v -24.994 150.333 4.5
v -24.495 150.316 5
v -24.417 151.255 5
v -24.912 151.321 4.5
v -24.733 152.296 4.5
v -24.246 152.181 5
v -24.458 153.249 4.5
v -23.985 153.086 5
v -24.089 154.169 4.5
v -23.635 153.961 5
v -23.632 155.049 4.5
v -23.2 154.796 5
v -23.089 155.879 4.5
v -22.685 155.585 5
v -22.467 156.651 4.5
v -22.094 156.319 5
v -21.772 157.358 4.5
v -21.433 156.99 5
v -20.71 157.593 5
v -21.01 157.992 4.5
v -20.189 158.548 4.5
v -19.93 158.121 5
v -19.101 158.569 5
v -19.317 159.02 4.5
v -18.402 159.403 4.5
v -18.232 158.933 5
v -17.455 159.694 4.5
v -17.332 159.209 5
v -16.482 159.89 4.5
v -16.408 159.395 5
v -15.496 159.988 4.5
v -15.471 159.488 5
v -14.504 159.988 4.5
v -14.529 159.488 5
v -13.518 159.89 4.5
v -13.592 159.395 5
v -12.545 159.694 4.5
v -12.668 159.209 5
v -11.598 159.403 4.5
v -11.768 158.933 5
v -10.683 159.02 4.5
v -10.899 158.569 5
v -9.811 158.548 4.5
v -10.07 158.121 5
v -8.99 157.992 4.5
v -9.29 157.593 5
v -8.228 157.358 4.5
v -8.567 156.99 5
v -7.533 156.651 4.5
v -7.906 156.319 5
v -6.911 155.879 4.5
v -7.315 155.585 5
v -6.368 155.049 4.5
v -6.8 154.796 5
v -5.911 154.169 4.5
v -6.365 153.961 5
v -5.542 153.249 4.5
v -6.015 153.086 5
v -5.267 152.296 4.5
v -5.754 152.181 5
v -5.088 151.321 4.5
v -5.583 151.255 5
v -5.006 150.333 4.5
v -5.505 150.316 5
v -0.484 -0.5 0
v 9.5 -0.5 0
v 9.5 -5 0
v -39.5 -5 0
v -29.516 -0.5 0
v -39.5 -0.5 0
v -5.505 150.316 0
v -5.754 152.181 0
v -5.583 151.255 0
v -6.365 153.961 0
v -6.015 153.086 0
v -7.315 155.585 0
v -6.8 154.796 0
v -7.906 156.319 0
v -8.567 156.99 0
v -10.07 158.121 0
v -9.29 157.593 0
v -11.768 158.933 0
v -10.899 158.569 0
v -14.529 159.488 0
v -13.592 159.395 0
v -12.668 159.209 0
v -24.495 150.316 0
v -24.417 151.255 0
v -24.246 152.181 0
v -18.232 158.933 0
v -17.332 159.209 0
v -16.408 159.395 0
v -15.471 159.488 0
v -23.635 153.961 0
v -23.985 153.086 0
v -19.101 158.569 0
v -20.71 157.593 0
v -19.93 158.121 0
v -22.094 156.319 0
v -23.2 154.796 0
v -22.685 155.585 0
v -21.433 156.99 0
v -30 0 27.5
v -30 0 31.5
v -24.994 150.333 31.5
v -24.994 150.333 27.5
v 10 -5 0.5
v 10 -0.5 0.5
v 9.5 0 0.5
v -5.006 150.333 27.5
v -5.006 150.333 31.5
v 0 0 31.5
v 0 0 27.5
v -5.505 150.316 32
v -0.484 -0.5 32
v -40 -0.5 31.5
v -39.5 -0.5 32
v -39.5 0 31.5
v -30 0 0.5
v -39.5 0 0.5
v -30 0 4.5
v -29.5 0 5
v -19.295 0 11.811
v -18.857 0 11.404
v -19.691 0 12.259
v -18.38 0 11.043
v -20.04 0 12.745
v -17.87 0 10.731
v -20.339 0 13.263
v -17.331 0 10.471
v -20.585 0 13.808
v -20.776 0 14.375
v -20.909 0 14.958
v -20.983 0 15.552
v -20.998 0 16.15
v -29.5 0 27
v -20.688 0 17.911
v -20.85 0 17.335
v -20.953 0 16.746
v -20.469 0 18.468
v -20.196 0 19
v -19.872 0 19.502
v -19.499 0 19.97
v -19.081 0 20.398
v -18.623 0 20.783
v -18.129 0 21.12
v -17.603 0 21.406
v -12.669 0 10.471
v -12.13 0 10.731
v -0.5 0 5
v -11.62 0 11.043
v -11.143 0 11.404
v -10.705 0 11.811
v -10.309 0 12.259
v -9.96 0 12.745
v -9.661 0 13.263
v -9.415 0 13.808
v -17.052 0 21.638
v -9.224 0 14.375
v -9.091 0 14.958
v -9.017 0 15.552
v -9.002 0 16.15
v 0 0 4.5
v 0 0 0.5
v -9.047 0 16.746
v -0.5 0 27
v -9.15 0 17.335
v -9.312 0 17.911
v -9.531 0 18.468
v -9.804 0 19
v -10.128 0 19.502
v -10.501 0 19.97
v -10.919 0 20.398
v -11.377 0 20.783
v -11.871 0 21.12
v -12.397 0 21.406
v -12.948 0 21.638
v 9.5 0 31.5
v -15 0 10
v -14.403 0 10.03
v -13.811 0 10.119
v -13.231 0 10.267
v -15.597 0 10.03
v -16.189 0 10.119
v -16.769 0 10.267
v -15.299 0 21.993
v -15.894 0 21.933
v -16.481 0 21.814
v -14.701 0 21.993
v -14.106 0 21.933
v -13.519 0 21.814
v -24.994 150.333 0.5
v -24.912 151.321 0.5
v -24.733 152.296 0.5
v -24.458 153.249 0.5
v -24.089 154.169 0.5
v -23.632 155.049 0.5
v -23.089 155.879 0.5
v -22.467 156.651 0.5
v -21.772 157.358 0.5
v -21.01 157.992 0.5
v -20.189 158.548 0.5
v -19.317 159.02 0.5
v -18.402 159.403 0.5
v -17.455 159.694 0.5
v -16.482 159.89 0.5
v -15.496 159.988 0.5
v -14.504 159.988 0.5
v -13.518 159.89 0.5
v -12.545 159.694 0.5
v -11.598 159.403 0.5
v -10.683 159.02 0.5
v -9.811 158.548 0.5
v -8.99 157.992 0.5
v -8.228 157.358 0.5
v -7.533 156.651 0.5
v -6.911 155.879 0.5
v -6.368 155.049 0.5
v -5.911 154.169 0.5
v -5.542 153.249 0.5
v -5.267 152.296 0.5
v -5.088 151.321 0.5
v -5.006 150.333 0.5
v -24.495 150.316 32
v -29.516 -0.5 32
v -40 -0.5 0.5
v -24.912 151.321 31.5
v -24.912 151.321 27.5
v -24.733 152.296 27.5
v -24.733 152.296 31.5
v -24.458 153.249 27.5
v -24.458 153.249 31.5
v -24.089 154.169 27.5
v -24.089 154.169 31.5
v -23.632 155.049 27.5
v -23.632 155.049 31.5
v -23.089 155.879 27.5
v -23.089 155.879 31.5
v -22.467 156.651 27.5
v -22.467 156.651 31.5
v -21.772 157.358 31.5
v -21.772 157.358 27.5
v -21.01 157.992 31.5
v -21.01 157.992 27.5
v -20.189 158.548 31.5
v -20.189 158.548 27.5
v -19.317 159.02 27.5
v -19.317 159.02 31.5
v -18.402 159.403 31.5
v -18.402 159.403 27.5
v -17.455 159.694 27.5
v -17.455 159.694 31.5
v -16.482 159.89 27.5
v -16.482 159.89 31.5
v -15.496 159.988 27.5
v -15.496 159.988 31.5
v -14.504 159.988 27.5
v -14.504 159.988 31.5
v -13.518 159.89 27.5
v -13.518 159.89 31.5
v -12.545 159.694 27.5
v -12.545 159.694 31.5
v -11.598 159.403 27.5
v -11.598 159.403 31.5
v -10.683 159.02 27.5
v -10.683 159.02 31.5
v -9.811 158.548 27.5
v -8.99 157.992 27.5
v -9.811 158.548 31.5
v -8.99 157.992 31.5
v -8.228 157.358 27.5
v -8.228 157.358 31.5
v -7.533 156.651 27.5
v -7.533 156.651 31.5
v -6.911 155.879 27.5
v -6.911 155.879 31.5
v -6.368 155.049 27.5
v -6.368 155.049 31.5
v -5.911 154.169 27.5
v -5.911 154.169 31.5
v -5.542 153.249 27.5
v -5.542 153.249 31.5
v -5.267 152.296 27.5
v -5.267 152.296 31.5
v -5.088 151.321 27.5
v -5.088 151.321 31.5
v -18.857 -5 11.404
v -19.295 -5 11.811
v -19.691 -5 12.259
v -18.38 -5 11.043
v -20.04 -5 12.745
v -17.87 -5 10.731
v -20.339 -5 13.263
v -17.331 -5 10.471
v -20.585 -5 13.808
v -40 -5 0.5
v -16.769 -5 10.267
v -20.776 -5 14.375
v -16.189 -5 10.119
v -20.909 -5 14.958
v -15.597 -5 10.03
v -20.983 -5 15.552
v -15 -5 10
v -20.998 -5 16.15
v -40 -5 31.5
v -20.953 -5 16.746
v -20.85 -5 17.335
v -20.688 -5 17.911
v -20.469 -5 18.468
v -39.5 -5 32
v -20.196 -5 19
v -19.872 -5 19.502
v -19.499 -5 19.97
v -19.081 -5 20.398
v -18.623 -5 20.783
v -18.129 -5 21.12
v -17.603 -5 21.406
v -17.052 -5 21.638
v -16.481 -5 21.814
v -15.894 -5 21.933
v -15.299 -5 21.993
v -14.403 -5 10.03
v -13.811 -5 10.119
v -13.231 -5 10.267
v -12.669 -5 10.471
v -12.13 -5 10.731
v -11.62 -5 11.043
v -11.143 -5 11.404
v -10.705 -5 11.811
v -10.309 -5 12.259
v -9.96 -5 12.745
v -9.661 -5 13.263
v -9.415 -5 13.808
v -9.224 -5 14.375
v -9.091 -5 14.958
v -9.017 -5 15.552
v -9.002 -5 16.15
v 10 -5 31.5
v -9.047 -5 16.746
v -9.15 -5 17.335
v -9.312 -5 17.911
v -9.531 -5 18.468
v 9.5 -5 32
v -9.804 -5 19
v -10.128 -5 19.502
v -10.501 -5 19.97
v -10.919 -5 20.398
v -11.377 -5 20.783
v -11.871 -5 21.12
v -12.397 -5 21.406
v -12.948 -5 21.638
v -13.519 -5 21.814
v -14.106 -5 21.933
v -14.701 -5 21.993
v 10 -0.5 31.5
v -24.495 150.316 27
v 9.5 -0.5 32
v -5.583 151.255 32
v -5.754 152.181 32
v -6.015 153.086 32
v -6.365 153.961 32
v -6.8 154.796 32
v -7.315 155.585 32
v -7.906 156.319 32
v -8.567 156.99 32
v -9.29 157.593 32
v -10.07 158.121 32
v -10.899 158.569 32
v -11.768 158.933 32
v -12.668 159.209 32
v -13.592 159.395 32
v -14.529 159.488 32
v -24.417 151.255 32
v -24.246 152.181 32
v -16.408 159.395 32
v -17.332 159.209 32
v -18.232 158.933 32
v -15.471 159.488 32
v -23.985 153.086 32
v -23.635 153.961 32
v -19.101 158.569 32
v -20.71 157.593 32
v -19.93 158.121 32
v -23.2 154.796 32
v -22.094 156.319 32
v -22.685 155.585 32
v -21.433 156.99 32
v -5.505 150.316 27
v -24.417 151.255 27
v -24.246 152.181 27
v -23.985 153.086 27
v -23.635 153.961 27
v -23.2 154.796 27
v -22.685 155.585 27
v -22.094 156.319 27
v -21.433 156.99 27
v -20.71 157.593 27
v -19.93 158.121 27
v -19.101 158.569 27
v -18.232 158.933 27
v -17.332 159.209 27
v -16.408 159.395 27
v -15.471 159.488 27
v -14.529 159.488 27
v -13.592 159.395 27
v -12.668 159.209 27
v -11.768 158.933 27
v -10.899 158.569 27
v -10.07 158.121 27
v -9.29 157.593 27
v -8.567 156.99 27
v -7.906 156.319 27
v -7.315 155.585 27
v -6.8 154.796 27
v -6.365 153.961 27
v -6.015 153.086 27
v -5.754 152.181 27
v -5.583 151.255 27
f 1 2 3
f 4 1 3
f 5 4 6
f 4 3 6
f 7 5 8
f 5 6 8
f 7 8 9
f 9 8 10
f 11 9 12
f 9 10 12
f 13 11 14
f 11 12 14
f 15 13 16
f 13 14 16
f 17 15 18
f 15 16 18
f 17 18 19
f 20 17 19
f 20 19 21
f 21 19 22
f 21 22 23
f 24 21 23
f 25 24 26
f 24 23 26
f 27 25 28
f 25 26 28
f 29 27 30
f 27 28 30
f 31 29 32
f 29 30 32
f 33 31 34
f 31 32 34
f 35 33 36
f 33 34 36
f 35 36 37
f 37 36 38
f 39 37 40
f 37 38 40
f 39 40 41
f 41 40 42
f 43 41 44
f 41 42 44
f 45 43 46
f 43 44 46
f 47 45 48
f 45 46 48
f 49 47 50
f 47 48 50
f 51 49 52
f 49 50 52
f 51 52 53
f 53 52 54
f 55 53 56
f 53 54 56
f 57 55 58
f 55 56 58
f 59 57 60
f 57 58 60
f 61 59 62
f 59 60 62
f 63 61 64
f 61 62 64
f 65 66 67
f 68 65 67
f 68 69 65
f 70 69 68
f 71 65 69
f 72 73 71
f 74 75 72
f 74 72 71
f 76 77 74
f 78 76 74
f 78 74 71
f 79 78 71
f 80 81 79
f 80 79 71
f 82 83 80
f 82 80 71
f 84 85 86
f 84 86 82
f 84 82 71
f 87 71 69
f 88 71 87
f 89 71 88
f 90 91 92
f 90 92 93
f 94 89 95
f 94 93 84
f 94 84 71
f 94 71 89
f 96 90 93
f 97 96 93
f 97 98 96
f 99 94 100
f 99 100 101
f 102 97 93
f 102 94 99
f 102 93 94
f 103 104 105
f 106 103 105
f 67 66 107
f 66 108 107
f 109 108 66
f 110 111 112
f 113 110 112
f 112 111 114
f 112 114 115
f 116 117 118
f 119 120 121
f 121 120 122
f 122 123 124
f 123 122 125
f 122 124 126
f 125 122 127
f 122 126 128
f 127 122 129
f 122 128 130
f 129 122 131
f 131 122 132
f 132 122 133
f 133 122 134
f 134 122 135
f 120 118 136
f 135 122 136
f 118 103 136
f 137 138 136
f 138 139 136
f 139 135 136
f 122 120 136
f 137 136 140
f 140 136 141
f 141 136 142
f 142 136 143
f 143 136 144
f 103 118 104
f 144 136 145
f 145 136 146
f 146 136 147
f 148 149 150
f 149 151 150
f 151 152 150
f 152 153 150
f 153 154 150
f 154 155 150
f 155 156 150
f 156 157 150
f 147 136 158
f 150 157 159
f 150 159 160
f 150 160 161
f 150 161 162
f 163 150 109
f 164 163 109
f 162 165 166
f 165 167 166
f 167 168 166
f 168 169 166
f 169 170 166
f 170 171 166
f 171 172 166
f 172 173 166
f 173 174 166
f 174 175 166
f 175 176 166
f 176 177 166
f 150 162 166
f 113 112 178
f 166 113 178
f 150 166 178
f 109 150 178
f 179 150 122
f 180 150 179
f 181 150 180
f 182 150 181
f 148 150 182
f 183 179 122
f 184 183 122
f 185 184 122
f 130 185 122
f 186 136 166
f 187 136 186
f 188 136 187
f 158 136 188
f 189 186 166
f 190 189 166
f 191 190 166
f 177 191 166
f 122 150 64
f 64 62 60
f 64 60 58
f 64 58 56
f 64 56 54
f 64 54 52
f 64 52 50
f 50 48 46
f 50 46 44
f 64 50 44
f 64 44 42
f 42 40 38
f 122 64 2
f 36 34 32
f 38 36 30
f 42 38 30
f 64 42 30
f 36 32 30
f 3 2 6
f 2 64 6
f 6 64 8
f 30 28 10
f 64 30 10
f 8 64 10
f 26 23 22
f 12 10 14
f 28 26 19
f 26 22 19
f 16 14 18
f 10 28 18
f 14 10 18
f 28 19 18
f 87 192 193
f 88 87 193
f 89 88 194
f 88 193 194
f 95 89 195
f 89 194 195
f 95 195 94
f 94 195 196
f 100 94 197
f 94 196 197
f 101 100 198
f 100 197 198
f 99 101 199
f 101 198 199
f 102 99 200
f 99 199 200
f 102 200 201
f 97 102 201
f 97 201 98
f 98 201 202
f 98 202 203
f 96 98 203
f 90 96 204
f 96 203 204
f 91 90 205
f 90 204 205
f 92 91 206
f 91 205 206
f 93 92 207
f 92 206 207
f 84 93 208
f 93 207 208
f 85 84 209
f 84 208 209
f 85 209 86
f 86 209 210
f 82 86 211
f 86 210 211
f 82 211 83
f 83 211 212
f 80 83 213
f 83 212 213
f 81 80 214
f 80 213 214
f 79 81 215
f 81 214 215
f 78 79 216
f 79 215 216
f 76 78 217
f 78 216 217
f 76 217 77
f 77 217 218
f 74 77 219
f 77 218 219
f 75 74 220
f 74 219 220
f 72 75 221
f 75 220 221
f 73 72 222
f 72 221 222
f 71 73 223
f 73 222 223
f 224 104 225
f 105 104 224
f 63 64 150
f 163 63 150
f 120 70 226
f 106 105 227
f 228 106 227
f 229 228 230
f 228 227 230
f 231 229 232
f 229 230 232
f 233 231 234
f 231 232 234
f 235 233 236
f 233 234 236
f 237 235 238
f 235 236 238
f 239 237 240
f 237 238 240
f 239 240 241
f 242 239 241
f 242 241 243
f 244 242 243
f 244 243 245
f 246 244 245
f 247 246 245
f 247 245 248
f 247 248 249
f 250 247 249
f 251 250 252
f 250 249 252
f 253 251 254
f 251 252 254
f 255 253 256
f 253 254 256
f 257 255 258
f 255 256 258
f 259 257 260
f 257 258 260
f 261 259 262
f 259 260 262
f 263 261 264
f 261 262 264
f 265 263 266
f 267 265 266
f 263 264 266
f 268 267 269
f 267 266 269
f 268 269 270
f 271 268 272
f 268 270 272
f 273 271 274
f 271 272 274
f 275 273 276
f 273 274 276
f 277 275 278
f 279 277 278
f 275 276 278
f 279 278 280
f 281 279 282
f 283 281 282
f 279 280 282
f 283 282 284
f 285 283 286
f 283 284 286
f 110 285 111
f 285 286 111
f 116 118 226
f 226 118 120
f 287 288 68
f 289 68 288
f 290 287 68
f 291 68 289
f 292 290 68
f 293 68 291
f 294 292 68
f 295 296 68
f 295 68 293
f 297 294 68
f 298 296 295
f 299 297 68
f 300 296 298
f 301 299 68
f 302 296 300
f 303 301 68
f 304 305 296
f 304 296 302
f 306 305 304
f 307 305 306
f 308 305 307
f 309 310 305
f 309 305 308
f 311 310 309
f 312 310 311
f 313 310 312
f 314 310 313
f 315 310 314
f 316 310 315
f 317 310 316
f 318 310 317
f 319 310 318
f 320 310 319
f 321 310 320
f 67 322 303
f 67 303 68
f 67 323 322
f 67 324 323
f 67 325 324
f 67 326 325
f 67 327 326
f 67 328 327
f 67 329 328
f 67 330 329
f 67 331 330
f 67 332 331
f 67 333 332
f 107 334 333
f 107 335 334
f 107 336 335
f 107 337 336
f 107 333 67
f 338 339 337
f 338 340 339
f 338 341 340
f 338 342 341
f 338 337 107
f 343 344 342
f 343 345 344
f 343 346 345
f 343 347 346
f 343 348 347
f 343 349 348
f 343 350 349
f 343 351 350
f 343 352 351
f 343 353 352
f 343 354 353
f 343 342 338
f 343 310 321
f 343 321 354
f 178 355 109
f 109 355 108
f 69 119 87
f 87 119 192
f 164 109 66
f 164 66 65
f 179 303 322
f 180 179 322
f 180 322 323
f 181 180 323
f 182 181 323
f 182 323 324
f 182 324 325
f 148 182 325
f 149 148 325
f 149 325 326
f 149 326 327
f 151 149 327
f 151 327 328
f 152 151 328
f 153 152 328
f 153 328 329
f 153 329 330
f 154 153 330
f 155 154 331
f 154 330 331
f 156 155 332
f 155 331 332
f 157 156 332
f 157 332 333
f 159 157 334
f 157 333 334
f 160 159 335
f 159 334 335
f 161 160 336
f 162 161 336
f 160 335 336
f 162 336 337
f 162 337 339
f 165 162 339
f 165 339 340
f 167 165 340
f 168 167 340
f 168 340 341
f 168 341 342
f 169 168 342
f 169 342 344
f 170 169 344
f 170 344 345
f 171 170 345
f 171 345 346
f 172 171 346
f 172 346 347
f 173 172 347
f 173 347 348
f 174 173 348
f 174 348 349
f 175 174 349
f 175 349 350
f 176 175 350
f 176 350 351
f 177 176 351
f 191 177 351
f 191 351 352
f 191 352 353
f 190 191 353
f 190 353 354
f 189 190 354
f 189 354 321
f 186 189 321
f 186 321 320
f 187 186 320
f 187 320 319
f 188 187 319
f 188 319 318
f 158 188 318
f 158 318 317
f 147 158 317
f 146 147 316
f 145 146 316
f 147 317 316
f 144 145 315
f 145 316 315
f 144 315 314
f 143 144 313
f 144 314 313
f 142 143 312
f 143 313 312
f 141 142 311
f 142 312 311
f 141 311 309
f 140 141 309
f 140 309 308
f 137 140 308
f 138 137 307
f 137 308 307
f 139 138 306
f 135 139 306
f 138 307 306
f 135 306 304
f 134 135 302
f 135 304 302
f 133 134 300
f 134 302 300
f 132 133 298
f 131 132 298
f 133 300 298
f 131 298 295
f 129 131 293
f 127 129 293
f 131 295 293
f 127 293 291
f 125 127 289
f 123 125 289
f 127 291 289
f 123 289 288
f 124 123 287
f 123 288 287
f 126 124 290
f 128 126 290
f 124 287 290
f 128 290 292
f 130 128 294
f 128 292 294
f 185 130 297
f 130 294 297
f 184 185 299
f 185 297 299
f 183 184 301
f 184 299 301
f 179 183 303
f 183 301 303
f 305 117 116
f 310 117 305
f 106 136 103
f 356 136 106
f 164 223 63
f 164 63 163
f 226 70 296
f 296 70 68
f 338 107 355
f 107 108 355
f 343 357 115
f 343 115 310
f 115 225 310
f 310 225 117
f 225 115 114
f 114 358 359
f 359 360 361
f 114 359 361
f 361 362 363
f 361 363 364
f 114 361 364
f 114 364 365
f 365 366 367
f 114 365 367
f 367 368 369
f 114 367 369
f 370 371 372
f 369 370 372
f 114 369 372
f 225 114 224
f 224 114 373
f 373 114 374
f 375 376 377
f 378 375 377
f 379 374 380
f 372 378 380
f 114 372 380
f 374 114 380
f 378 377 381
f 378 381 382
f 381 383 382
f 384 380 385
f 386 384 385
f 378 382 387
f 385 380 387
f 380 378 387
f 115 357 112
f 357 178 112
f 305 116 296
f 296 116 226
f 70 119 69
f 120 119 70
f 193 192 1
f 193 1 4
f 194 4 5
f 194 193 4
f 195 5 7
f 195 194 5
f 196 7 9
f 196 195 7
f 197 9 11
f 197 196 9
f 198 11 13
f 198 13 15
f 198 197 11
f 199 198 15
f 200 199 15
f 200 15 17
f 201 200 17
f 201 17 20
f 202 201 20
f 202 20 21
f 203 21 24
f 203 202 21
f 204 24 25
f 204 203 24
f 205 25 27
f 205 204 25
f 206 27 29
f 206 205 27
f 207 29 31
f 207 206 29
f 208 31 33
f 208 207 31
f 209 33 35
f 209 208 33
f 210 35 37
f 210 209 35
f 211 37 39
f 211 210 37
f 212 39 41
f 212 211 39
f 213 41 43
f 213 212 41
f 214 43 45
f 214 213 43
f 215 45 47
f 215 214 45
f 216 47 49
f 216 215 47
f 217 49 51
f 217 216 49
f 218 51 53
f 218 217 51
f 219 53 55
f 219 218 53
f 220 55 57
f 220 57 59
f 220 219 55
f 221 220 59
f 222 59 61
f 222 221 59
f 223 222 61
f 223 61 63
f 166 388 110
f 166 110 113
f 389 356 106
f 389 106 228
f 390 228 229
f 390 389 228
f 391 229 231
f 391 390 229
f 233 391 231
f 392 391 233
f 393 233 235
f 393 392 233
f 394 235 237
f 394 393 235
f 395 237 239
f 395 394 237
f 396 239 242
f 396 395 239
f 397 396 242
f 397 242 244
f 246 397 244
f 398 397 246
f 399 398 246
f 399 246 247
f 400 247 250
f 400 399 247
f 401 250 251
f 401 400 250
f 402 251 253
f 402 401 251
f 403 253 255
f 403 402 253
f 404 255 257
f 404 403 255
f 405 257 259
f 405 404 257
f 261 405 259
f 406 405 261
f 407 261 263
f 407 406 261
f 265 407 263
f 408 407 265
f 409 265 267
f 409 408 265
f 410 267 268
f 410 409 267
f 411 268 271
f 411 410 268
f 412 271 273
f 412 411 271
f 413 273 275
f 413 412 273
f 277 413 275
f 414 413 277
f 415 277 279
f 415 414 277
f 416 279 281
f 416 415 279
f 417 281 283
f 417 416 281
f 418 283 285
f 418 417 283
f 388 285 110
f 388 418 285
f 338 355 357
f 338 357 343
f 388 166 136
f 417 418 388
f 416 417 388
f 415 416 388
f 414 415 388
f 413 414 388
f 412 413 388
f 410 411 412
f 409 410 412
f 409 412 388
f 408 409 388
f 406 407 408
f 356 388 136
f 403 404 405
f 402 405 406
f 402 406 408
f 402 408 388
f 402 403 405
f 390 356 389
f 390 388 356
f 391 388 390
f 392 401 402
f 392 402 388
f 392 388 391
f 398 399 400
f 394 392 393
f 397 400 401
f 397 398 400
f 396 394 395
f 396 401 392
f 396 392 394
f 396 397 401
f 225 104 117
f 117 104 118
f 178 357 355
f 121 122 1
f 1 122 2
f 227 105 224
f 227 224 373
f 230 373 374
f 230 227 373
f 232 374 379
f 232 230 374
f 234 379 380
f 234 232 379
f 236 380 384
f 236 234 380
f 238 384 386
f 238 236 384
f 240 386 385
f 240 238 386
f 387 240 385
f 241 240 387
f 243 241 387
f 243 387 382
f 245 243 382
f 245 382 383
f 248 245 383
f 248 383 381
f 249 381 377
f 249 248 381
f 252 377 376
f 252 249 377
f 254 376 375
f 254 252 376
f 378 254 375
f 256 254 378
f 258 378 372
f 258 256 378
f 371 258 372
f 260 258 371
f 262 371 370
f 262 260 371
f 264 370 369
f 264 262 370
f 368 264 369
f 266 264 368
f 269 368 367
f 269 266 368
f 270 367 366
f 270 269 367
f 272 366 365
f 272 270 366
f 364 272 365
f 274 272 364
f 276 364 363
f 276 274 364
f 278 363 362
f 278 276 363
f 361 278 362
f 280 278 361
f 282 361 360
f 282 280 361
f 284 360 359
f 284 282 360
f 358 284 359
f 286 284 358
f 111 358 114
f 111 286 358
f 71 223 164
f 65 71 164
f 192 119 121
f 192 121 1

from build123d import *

# Parameters (mm, degrees)
BOSS_EXTRUDE2_DEPTH = 5
BOSS_EXTRUDE3_DEPTH = 5
SKETCH3_R           = 6
CUT_EXTRUDE1_DEPTH  = 173.768631412
CHAMFER1_SIZE       = 0.5


with BuildPart() as part:
    # Sketch2 → Boss-Extrude2 (new body)
    with BuildSketch(Plane(origin=(0, 0, 0), x_dir=(1, 0, 0), z_dir=(0, 1, 0))):
        Polygon((0, 0), (-40, 0), (-40, -16), (0, -16), (10, -16), (10, 0), align=None)
    extrude(amount=-BOSS_EXTRUDE2_DEPTH)

    # Sketch1 → Boss-Extrude3 (add)
    with BuildSketch(Plane.XY):
        with BuildLine():
            Line((0, 0), (-30, 0))
            Line((-30, 0), (-24.994461357, 150.332779469))
            ThreePointArc((-24.994461357, 150.332779469), (-15, 160), (-5.005538643, 150.332779469))
            Line((-5.005538643, 150.332779469), (0, 0))
        make_face()
    extrude(amount=BOSS_EXTRUDE3_DEPTH)

    # Mirror1: part across plane


with BuildPart() as part_1:
    add(part.part)
    add(part.part.mirror(Plane(origin=(10, -5, 16), x_dir=(1, 0, 0), z_dir=(0, 0, 1))))

    # Sketch3 → Cut-Extrude1 (cut, through all)
    with BuildSketch(Plane.XZ.offset(5)):
        with Locations(Location((-15, 16, 0), (0, 0, 270))):
            Circle(SKETCH3_R)
    extrude(amount=-CUT_EXTRUDE1_DEPTH, mode=Mode.SUBTRACT)

    # Chamfer1
    chamfer1_edges = [part_1.edges().sort_by_distance(p)[0] for p in [
        (10, -2.5, 0),
        (-40, -2.5, 0),
        (-35, 0, 0),
        (-2.502769321, 75.166389735, 0),
        (-15, 160, 0),
        (-27.497230679, 75.166389735, 0),
        (-2.502769321, 75.166389735, 5),
        (-15, 160, 5),
        (-27.497230679, 75.166389735, 5),
        (-40, -2.5, 32),
        (5, 0, 32),
        (-2.502769321, 75.166389735, 32),
        (-15, 160, 32),
        (-27.497230679, 75.166389735, 32),
        (-35, 0, 32),
        (10, -2.5, 32),
        (-2.502769321, 75.166389735, 27),
        (-15, 160, 27),
        (-27.497230679, 75.166389735, 27),
        (10, 0, 16),
        (-40, 0, 16),
        (5, 0, 0),
    ]]
    chamfer(chamfer1_edges, length=CHAMFER1_SIZE)


solid = part_1.part
